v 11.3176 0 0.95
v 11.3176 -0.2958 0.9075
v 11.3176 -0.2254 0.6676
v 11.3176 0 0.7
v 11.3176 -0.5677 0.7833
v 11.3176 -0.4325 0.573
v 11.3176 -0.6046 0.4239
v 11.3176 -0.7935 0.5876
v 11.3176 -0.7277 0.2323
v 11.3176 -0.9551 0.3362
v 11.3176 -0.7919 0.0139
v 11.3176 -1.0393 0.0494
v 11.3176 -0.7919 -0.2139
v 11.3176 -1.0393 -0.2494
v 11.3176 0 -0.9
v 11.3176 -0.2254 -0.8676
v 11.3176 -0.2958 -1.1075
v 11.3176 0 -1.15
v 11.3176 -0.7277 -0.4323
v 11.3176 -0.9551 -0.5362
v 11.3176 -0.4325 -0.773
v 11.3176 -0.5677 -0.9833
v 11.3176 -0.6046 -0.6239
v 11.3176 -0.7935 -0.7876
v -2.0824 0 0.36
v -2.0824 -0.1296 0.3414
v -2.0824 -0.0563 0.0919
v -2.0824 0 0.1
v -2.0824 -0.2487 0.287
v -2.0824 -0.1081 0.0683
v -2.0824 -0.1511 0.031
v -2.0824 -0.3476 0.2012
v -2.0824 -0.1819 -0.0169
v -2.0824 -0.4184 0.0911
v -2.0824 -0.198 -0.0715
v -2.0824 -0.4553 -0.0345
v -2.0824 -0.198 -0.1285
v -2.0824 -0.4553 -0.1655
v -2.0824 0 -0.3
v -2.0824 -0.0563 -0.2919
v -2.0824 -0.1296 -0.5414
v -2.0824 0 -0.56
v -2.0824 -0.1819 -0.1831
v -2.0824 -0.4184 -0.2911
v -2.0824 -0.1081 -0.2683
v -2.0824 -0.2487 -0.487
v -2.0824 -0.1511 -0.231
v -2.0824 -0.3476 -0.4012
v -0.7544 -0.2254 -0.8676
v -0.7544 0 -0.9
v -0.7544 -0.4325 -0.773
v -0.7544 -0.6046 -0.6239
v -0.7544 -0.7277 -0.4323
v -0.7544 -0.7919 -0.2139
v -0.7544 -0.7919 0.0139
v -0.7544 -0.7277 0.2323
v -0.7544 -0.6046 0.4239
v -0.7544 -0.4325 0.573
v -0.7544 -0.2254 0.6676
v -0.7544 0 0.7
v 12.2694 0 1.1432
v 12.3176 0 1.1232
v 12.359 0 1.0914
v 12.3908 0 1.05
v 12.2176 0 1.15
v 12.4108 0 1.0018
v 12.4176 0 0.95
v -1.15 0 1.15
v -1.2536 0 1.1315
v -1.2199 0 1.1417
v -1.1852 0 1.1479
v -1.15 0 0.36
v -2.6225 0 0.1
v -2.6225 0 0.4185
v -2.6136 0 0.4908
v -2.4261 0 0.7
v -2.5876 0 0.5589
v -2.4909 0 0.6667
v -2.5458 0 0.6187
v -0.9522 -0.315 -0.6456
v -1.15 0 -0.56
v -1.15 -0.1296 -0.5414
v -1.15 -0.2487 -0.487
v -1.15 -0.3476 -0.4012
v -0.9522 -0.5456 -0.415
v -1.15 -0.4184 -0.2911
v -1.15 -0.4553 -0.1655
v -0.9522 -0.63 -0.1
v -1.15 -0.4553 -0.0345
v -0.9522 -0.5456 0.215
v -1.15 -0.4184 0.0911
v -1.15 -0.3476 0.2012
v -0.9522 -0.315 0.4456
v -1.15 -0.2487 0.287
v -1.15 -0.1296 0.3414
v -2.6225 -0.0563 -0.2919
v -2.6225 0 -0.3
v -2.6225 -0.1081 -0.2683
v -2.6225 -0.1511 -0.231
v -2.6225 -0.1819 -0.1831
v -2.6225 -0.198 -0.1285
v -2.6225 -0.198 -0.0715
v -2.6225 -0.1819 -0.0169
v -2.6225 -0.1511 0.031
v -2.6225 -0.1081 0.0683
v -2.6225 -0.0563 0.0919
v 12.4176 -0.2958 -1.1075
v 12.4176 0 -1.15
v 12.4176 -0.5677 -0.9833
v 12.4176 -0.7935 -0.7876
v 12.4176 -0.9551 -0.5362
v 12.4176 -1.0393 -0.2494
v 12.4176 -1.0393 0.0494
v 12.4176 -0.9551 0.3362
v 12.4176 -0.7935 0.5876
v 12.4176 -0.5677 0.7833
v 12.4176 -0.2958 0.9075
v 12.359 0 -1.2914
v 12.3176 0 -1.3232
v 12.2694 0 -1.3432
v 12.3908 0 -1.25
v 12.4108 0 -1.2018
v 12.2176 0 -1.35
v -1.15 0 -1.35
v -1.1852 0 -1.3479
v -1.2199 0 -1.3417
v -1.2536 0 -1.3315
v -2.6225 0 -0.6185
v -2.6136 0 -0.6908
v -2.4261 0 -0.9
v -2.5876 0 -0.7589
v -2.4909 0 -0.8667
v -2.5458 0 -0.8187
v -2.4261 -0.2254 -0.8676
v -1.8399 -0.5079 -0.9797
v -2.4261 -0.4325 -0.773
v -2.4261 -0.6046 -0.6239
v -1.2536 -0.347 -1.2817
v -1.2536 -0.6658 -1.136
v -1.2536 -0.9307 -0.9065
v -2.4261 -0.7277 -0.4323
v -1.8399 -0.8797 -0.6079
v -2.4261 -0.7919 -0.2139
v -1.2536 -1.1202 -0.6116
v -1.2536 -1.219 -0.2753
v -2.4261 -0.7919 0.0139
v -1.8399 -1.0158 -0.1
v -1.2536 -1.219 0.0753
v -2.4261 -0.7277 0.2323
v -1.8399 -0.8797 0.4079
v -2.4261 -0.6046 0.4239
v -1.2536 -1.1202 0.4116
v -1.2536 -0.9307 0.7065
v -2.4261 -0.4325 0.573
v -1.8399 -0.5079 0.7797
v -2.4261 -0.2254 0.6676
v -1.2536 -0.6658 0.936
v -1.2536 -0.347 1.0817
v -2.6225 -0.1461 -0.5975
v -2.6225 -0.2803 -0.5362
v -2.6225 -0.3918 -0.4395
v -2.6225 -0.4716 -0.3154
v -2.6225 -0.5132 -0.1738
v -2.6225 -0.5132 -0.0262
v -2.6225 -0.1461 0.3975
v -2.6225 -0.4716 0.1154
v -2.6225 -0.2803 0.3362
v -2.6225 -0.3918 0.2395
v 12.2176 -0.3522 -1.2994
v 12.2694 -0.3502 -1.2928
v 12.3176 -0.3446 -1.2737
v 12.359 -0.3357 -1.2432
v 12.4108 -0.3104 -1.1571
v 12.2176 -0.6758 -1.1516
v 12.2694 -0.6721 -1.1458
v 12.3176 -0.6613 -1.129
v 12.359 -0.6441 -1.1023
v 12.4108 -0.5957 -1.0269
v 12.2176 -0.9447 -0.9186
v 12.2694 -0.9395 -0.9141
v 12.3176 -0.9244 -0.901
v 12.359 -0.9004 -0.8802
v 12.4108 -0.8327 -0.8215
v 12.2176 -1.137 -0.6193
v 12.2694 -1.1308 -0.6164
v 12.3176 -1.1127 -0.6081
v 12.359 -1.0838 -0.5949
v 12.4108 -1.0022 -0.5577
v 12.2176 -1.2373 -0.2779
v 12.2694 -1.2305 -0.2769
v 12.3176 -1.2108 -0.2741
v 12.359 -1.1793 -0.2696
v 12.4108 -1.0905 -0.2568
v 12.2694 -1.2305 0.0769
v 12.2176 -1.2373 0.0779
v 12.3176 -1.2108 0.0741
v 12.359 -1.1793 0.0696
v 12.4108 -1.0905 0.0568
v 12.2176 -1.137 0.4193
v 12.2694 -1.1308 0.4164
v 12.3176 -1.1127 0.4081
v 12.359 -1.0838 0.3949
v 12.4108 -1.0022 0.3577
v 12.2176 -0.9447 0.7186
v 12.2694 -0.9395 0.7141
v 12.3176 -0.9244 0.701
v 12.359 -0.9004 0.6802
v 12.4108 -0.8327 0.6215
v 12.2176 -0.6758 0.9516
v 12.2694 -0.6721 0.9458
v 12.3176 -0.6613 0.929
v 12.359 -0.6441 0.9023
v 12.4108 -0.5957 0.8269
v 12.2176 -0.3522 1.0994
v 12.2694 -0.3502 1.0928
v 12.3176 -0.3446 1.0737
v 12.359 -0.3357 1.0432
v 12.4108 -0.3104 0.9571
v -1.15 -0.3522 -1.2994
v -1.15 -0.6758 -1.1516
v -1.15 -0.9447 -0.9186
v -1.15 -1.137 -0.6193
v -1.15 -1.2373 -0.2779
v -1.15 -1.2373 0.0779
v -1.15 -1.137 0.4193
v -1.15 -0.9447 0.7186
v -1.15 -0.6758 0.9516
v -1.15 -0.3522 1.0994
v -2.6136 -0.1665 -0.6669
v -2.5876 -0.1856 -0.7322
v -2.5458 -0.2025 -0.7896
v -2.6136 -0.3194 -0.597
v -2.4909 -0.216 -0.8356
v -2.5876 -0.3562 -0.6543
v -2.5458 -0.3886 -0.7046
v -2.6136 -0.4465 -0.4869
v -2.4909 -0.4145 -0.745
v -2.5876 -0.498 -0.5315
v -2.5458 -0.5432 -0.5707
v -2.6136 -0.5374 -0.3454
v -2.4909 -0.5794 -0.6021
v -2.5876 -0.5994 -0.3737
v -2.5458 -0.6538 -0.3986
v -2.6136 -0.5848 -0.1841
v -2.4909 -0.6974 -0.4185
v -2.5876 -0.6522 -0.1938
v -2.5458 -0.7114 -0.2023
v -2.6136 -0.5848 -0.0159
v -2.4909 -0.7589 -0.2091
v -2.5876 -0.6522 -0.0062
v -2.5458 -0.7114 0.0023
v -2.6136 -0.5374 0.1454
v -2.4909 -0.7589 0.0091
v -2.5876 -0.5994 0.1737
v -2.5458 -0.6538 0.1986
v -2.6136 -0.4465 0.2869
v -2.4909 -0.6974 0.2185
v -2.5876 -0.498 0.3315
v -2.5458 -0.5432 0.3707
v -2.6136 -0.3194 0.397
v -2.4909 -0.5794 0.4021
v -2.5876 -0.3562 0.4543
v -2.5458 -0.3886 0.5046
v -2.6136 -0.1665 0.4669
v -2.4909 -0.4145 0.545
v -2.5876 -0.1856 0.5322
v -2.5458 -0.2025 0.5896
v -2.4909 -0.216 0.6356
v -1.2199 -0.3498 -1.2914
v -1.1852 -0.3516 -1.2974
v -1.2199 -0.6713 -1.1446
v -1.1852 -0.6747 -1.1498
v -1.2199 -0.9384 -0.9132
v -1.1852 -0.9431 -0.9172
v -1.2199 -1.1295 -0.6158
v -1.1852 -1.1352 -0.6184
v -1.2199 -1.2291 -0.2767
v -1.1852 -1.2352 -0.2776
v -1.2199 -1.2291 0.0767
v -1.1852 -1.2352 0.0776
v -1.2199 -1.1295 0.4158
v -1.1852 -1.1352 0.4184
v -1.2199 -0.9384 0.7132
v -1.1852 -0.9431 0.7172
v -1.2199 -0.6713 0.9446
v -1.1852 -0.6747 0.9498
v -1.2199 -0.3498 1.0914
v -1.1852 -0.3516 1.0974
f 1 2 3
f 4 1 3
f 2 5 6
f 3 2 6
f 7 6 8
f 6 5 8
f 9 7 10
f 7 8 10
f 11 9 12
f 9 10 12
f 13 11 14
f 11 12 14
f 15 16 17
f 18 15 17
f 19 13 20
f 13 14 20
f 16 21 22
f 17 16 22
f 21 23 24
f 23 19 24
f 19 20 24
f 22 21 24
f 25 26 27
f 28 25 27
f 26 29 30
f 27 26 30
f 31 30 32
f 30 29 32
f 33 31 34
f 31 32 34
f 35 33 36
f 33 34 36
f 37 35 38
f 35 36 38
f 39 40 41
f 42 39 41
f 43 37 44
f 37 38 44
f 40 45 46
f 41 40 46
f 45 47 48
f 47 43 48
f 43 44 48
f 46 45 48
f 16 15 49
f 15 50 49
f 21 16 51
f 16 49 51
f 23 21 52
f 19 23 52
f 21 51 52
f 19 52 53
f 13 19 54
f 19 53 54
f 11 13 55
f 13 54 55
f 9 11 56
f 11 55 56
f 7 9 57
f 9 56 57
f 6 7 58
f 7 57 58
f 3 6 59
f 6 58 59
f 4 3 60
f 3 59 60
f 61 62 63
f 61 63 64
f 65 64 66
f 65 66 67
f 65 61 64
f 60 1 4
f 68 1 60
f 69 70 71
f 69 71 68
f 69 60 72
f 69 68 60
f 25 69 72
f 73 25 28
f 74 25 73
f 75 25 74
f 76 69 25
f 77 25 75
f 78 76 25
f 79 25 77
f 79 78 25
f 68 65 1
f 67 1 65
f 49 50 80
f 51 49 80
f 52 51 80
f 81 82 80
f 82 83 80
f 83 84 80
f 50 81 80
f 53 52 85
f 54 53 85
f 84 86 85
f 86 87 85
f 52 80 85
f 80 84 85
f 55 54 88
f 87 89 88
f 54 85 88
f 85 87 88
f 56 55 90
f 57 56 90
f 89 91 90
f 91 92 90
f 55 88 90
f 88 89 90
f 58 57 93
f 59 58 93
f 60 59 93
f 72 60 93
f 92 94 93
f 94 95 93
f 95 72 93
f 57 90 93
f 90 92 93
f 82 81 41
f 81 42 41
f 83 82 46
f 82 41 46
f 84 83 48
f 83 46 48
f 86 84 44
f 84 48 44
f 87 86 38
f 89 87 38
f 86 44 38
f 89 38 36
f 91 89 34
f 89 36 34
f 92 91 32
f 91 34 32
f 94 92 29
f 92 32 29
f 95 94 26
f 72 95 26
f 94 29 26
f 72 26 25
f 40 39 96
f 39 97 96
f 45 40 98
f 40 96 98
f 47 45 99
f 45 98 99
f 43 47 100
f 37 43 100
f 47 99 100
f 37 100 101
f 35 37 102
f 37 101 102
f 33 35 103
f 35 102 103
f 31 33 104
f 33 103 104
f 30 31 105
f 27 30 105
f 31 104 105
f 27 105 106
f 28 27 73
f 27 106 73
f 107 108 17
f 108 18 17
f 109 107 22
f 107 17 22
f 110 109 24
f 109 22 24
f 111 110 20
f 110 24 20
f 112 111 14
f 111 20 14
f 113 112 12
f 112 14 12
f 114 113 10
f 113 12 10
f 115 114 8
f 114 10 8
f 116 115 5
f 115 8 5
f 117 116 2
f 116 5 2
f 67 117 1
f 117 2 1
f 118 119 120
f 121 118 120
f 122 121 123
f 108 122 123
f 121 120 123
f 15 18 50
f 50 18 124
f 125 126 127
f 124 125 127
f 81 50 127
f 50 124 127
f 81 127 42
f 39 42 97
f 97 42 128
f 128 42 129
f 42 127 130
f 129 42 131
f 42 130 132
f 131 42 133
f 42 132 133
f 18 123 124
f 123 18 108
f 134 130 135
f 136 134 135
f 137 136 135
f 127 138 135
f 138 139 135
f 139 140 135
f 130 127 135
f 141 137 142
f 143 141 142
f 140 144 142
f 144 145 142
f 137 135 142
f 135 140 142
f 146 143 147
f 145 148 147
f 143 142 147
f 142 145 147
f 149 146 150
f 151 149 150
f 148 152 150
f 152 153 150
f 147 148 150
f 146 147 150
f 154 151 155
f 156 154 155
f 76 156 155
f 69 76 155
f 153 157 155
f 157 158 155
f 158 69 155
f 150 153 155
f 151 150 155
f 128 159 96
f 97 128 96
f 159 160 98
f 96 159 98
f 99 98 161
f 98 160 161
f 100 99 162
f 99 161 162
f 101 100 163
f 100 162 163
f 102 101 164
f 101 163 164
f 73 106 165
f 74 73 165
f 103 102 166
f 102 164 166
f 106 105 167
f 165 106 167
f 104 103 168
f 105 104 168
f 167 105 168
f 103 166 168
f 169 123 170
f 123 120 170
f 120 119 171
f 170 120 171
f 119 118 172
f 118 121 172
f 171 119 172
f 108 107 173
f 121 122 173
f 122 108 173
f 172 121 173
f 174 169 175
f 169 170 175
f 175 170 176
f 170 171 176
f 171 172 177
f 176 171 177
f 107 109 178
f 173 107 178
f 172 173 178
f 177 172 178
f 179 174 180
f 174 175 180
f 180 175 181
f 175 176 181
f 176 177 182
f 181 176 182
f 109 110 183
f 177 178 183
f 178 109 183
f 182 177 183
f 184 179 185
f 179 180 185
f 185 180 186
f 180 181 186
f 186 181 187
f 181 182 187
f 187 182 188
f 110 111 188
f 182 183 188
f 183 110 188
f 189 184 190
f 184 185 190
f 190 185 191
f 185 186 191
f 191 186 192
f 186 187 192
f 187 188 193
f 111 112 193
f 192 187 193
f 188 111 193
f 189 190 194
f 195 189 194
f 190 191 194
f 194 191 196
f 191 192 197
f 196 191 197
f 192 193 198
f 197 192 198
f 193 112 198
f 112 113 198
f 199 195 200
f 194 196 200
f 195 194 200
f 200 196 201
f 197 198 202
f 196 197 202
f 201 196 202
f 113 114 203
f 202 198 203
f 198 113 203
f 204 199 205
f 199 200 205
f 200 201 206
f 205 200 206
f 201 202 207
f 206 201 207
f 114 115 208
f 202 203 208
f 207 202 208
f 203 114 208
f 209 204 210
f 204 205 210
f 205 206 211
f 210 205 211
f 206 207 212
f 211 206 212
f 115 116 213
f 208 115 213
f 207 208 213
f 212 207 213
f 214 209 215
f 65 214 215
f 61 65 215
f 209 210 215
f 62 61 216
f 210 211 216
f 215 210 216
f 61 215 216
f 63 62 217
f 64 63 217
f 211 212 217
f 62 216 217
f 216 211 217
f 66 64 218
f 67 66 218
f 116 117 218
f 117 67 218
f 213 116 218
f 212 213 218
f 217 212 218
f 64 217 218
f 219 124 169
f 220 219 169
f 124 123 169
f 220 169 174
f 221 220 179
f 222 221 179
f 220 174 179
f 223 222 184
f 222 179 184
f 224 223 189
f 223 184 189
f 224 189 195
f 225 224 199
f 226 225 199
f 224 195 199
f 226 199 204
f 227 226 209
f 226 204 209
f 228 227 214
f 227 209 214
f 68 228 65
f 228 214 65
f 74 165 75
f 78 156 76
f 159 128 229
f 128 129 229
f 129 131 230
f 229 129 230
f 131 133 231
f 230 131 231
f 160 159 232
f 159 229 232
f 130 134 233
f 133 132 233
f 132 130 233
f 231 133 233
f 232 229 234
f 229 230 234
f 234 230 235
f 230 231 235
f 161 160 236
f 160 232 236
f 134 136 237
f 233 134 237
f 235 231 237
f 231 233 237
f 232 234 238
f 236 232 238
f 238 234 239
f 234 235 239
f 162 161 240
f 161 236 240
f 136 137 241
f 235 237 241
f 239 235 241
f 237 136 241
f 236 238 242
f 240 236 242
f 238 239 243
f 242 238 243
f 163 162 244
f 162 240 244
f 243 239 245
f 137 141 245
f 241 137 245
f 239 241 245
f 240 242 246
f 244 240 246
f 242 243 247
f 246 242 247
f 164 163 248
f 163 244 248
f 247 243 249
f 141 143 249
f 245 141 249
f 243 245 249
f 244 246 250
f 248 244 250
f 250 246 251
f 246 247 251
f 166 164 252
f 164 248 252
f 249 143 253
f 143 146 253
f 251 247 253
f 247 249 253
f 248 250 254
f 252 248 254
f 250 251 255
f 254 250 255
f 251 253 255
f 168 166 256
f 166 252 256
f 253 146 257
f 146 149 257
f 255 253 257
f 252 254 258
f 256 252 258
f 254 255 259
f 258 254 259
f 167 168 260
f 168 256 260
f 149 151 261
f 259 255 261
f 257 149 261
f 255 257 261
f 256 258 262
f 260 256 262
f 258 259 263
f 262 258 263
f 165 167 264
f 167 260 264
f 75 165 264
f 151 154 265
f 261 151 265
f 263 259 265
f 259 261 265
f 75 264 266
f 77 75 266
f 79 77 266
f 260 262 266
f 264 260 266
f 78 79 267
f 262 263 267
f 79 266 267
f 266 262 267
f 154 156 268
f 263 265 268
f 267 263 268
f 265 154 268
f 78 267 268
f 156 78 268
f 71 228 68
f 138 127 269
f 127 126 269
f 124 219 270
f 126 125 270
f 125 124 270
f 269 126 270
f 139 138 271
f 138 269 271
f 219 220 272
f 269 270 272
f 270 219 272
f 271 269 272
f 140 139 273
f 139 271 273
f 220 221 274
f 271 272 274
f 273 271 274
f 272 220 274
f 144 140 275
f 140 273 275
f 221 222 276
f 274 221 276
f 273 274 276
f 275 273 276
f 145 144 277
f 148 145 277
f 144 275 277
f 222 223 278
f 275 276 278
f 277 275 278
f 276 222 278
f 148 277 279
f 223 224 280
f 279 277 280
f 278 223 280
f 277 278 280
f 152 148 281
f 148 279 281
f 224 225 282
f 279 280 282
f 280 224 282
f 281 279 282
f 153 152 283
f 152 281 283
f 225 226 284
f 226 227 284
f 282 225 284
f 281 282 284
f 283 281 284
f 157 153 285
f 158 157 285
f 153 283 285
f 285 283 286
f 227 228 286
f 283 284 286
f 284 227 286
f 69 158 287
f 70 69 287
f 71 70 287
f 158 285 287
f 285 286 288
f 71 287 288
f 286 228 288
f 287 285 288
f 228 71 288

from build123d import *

# Parameters (mm, degrees)
REVOLVE1_ANGLE = 180


with BuildPart() as part:
    # Sketch1 → Revolve1 (revolve)
    with BuildSketch(Plane(origin=(0, 0, 0), x_dir=(1, 0, 0), z_dir=(0, 1, 0))):
        with BuildLine():
            Line((-2.426089026, 0.9), (-1.253621619, 1.331536072))
            ThreePointArc((-1.253621619, 1.331536072), (-1.202626886, 1.345347949), (-1.15, 1.35))
            Line((-1.15, 1.35), (12.217609628, 1.35))
            ThreePointArc((12.217609628, 1.35), (12.359030984, 1.291421356), (12.417609628, 1.15))
            Line((12.417609628, 1.15), (11.317609628, 1.15))
            Line((11.317609628, 1.15), (11.317609628, 0.9))
            Line((11.317609628, 0.9), (3.617609628, 0.9))
            Line((3.617609628, 0.9), (2.917609628, 0.9))
            Line((2.917609628, 0.9), (-0.754449261, 0.9))
            Line((-0.754449261, 0.9), (-1.15, 0.56))
            Line((-1.15, 0.56), (-2.082390372, 0.56))
            Line((-2.082390372, 0.56), (-2.082390372, 0.3))
            Line((-2.082390372, 0.3), (-2.622467407, 0.3))
            Line((-2.622467407, 0.3), (-2.622467407, 0.618463928))
            ThreePointArc((-2.622467407, 0.618463928), (-2.568522772, 0.790093637), (-2.426089026, 0.9))
        make_face()
    revolve(axis=Axis((-3.185032955, 0, -0.1), (-1, 0, 0)), revolution_arc=REVOLVE1_ANGLE)


solid = part.part
